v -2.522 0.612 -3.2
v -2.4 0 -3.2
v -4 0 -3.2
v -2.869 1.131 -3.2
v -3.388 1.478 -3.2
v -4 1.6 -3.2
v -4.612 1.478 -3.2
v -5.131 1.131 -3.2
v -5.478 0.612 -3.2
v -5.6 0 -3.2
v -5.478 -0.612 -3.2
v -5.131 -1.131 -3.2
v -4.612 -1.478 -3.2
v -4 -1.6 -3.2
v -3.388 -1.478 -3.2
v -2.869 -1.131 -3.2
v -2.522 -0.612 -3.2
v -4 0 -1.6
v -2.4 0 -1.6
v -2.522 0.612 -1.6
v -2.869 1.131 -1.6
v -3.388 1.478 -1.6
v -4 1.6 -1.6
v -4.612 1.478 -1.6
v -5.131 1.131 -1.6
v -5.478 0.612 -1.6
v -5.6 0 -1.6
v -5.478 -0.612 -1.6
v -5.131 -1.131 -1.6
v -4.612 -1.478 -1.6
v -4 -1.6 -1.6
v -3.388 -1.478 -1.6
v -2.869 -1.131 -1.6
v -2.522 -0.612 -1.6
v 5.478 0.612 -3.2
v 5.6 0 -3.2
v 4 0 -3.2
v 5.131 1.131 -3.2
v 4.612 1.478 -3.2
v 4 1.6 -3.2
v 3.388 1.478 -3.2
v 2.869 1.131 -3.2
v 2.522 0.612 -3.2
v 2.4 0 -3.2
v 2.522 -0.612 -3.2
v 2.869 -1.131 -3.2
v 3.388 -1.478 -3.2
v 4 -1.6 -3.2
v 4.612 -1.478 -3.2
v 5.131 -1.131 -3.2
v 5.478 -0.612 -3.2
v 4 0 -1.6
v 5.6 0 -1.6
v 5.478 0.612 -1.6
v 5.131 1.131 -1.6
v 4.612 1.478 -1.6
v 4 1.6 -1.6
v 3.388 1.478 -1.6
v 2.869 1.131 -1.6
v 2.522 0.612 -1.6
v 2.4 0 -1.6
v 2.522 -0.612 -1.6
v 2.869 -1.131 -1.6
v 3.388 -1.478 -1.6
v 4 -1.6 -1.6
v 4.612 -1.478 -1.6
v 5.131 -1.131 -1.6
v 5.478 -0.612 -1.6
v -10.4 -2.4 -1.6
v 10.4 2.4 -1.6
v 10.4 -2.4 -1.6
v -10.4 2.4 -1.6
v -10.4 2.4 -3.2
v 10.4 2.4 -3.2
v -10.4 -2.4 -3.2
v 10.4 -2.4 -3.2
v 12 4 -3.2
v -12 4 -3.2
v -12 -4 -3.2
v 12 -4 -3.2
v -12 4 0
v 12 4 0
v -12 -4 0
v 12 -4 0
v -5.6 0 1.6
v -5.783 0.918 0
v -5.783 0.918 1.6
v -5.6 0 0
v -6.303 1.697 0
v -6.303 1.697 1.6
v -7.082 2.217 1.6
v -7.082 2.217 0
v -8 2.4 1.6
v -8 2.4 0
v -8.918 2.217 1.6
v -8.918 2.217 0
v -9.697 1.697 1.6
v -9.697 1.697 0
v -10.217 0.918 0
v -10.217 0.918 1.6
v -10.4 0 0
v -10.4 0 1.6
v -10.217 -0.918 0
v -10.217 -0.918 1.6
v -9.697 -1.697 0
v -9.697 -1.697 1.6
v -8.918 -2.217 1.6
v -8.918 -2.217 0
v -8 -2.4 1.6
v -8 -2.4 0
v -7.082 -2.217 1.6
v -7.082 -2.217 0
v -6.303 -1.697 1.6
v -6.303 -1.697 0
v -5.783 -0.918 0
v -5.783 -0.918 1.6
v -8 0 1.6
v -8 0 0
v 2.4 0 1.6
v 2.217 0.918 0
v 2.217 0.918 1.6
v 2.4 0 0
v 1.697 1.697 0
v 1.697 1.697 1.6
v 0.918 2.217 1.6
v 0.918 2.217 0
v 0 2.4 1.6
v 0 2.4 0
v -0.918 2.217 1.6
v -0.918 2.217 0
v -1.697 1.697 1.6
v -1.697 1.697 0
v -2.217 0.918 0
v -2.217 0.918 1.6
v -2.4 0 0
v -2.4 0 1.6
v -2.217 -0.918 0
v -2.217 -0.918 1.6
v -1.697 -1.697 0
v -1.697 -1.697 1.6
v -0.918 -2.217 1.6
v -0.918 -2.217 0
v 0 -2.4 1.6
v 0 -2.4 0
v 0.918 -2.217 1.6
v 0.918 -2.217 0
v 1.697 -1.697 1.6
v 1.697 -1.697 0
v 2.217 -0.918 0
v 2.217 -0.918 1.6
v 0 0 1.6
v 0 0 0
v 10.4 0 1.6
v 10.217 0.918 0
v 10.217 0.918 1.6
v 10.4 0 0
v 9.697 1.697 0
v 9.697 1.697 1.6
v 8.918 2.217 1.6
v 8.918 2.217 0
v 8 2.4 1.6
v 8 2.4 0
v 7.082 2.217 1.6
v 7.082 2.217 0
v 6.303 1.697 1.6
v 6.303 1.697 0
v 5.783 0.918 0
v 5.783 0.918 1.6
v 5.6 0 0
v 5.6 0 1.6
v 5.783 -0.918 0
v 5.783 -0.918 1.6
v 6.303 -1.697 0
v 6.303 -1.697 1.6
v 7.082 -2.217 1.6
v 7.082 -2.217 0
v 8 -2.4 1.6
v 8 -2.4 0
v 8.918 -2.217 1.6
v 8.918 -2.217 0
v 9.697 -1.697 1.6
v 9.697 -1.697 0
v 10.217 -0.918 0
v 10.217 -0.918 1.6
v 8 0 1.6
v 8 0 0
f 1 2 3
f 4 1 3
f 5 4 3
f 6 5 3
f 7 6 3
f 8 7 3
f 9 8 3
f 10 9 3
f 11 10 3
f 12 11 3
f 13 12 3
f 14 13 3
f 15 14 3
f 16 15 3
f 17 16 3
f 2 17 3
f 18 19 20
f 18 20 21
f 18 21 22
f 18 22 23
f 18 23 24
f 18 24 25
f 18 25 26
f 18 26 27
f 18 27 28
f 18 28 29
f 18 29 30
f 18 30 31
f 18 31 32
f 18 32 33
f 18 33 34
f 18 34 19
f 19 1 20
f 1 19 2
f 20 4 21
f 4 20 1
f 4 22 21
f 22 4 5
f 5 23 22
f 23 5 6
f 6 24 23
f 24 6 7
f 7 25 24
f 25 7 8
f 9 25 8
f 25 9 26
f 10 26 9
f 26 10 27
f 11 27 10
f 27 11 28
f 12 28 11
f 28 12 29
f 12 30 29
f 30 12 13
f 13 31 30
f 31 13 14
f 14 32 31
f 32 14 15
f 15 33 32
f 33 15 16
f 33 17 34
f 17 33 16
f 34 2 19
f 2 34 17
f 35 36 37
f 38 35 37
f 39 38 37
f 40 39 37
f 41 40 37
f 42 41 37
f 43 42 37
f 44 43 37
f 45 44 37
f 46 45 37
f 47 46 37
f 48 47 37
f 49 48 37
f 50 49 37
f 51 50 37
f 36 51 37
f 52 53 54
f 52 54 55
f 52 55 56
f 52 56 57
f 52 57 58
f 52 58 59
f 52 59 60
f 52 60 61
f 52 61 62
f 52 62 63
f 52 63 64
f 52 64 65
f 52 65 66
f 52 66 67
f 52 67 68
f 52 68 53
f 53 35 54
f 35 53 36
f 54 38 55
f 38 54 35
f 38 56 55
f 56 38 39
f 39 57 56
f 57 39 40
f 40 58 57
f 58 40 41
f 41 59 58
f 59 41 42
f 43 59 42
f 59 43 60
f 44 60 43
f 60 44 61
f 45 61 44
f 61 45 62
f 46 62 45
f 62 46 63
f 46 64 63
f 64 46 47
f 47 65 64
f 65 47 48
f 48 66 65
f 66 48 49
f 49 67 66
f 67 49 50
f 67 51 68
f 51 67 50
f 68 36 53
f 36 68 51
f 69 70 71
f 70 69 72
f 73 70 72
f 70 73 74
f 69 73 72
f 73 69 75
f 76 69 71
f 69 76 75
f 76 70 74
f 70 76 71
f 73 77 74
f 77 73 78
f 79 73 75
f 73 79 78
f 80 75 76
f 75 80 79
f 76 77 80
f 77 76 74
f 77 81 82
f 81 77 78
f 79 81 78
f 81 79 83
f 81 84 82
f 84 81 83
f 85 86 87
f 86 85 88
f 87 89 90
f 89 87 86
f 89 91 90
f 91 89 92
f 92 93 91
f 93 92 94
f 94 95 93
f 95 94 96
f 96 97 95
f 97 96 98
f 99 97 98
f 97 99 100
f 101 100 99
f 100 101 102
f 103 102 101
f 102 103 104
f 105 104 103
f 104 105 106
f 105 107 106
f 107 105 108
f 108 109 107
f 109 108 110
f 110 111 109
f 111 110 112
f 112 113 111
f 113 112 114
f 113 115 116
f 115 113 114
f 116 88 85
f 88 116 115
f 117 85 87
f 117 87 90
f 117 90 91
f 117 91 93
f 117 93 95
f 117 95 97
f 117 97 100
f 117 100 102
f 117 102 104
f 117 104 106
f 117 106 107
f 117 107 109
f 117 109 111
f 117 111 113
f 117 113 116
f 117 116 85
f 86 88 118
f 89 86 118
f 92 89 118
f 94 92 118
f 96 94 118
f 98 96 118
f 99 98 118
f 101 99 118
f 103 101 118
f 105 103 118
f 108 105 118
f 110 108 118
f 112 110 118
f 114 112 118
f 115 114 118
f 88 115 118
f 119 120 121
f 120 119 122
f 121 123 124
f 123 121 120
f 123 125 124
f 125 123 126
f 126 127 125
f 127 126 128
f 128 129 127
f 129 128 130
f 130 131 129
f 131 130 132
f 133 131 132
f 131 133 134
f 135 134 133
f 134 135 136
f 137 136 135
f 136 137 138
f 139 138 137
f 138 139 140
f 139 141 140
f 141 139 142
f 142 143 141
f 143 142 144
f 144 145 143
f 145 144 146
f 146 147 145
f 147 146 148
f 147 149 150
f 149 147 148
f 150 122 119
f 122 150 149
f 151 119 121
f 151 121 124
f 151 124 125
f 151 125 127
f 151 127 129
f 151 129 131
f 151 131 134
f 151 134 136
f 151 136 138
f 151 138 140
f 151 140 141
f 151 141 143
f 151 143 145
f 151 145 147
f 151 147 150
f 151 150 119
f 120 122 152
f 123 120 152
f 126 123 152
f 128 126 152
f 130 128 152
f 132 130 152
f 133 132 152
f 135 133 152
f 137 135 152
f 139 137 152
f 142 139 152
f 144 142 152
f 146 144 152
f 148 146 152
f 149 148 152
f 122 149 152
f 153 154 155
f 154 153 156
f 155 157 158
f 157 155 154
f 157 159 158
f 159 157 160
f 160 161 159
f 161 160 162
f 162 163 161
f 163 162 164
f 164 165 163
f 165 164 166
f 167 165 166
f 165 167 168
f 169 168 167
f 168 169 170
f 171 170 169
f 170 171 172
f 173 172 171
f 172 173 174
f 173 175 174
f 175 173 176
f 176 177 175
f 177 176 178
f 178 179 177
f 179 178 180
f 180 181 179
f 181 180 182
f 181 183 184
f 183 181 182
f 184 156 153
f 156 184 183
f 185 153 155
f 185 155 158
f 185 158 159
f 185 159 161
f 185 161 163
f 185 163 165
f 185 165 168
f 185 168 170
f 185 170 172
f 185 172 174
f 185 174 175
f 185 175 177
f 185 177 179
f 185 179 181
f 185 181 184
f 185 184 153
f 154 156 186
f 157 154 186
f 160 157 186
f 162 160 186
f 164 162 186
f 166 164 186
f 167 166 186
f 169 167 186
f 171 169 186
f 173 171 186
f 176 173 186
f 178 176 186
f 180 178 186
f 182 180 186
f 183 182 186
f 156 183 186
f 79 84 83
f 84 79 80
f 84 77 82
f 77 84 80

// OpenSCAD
// file: ../p/4-4edge.scad
use <../lib.scad>
function ldraw_lib__4_4edge() = [
// 0 Circle 1.0
// 0 Name: 4-4edge.dat
// 0 Author: James Jessiman
// 0 !LDRAW_ORG Primitive UPDATE 2017-01
// 0 !LICENSE Licensed under CC BY 2.0 and CC BY 4.0 : see CAreadme.txt
// 
// 0 BFC CERTIFY CCW
  [0,"BFC","CERTIFY"],
  [0,"BFC","CCW"],
// 
// 0 !HISTORY 1998-12-15 [PTadmin] Official Update 1998-10
// 0 !HISTORY 2005-12-28 [PTadmin] Official Update 2005-01
// 0 !HISTORY 2007-06-24 [PTadmin] Header formatted for Contributor Agreement
// 0 !HISTORY 2008-07-01 [PTadmin] Official Update 2008-01
// 0 !HISTORY 2017-01-15 [Steffen] BFCed
// 0 !HISTORY 2017-12-30 [PTadmin] Official Update 2017-01
// 
// 
// 2 24 1 0 0 0.9239 0 0.3827
  [2,24,1,0,0,0.9239,0,0.3827],
// 2 24 0.9239 0 0.3827 0.7071 0 0.7071
  [2,24,0.9239,0,0.3827,0.7071,0,0.7071],
// 2 24 0.7071 0 0.7071 0.3827 0 0.9239
  [2,24,0.7071,0,0.7071,0.3827,0,0.9239],
// 2 24 0.3827 0 0.9239 0 0 1
  [2,24,0.3827,0,0.9239,0,0,1],
// 2 24 0 0 1 -0.3827 0 0.9239
  [2,24,0,0,1,-0.3827,0,0.9239],
// 2 24 -0.3827 0 0.9239 -0.7071 0 0.7071
  [2,24,-0.3827,0,0.9239,-0.7071,0,0.7071],
// 2 24 -0.7071 0 0.7071 -0.9239 0 0.3827
  [2,24,-0.7071,0,0.7071,-0.9239,0,0.3827],
// 2 24 -0.9239 0 0.3827 -1 0 -0
  [2,24,-0.9239,0,0.3827,-1,0,-0],
// 2 24 -1 0 -0 -0.9239 0 -0.3827
  [2,24,-1,0,-0,-0.9239,0,-0.3827],
// 2 24 -0.9239 0 -0.3827 -0.7071 0 -0.7071
  [2,24,-0.9239,0,-0.3827,-0.7071,0,-0.7071],
// 2 24 -0.7071 0 -0.7071 -0.3827 0 -0.9239
  [2,24,-0.7071,0,-0.7071,-0.3827,0,-0.9239],
// 2 24 -0.3827 0 -0.9239 0 0 -1
  [2,24,-0.3827,0,-0.9239,0,0,-1],
// 2 24 0 0 -1 0.3827 0 -0.9239
  [2,24,0,0,-1,0.3827,0,-0.9239],
// 2 24 0.3827 0 -0.9239 0.7071 0 -0.7071
  [2,24,0.3827,0,-0.9239,0.7071,0,-0.7071],
// 2 24 0.7071 0 -0.7071 0.9239 0 -0.3827
  [2,24,0.7071,0,-0.7071,0.9239,0,-0.3827],
// 2 24 0.9239 0 -0.3827 1 0 0
  [2,24,0.9239,0,-0.3827,1,0,0],
];
module ldraw_lib__4_4edge(step=0, col=false, unit=2/5, alt=false, line=0.2, solid=!$preview)
    makepoly(ldraw_lib__4_4edge(), step=step, col=col, unit=unit, alt=alt, line=line, solid=solid);
ldraw_lib__4_4edge(line=0.2);
// file: ../p/4-4disc.scad
use <../lib.scad>
function ldraw_lib__4_4disc() = [
// 0 Disc 1.0
// 0 Name: 4-4disc.dat
// 0 Author: James Jessiman
// 0 !LDRAW_ORG Primitive UPDATE 2002-02
// 0 !LICENSE Licensed under CC BY 2.0 and CC BY 4.0 : see CAreadme.txt
// 
// 0 BFC CERTIFY CCW
  [0,"BFC","CERTIFY"],
  [0,"BFC","CCW"],
// 
// 0 !HISTORY 1998-12-15 [PTadmin] Official Update 1998-10
// 0 !HISTORY 2002-03-23 [sbliss] Added BFC statement
// 0 !HISTORY 2002-04-25 [PTadmin] Official Update 2002-02
// 0 !HISTORY 2007-06-24 [PTadmin] Header formatted for Contributor Agreement
// 0 !HISTORY 2008-07-01 [PTadmin] Official Update 2008-01
// 
// 
// 3 16 0 0 0 1 0 0 0.9239 0 0.3827
  [3,16,0,0,0,1,0,0,0.9239,0,0.3827],
// 3 16 0 0 0 0.9239 0 0.3827 0.7071 0 0.7071
  [3,16,0,0,0,0.9239,0,0.3827,0.7071,0,0.7071],
// 3 16 0 0 0 0.7071 0 0.7071 0.3827 0 0.9239
  [3,16,0,0,0,0.7071,0,0.7071,0.3827,0,0.9239],
// 3 16 0 0 0 0.3827 0 0.9239 0 0 1
  [3,16,0,0,0,0.3827,0,0.9239,0,0,1],
// 3 16 0 0 0 0 0 1 -0.3827 0 0.9239
  [3,16,0,0,0,0,0,1,-0.3827,0,0.9239],
// 3 16 0 0 0 -0.3827 0 0.9239 -0.7071 0 0.7071
  [3,16,0,0,0,-0.3827,0,0.9239,-0.7071,0,0.7071],
// 3 16 0 0 0 -0.7071 0 0.7071 -0.9239 0 0.3827
  [3,16,0,0,0,-0.7071,0,0.7071,-0.9239,0,0.3827],
// 3 16 0 0 0 -0.9239 0 0.3827 -1 0 -0
  [3,16,0,0,0,-0.9239,0,0.3827,-1,0,-0],
// 3 16 0 0 0 -1 0 -0 -0.9239 0 -0.3827
  [3,16,0,0,0,-1,0,-0,-0.9239,0,-0.3827],
// 3 16 0 0 0 -0.9239 0 -0.3827 -0.7071 0 -0.7071
  [3,16,0,0,0,-0.9239,0,-0.3827,-0.7071,0,-0.7071],
// 3 16 0 0 0 -0.7071 0 -0.7071 -0.3827 0 -0.9239
  [3,16,0,0,0,-0.7071,0,-0.7071,-0.3827,0,-0.9239],
// 3 16 0 0 0 -0.3827 0 -0.9239 0 0 -1
  [3,16,0,0,0,-0.3827,0,-0.9239,0,0,-1],
// 3 16 0 0 0 0 0 -1 0.3827 0 -0.9239
  [3,16,0,0,0,0,0,-1,0.3827,0,-0.9239],
// 3 16 0 0 0 0.3827 0 -0.9239 0.7071 0 -0.7071
  [3,16,0,0,0,0.3827,0,-0.9239,0.7071,0,-0.7071],
// 3 16 0 0 0 0.7071 0 -0.7071 0.9239 0 -0.3827
  [3,16,0,0,0,0.7071,0,-0.7071,0.9239,0,-0.3827],
// 3 16 0 0 0 0.9239 0 -0.3827 1 0 0
  [3,16,0,0,0,0.9239,0,-0.3827,1,0,0],
// 0
];
module ldraw_lib__4_4disc(step=0, col=false, unit=2/5, alt=false, line=0.2, solid=!$preview)
    makepoly(ldraw_lib__4_4disc(), step=step, col=col, unit=unit, alt=alt, line=line, solid=solid);
ldraw_lib__4_4disc(line=0.2);
// file: ../p/4-4cyli.scad
use <../lib.scad>
$fa=1; $fs=0.2;
function ldraw_lib__4_4cyli(realsolid=false) = [
// 0 Cylinder 1.0
// 0 Name: 4-4cyli.dat
// 0 Author: James Jessiman
// 0 !LDRAW_ORG Primitive UPDATE 2005-01
// 0 !LICENSE Licensed under CC BY 2.0 and CC BY 4.0 : see CAreadme.txt
// 
// 0 BFC CERTIFY CCW
  [0,"BFC","CERTIFY"],
  [0,"BFC","CCW"],
// 
// 0 !HISTORY 1998-12-15 [PTadmin] Official Update 1998-10
// 0 !HISTORY 2002-03-23 [sbliss] Added BFC statement; merged headers from files in distributions LDraw 0.27 and Complete.
// 0 !HISTORY 2002-04-25 [PTadmin] Official Update 2002-02
// 0 !HISTORY 2004-12-14 [guyvivan] BFC CCW
// 0 !HISTORY 2005-12-28 [PTadmin] Official Update 2005-01
// 0 !HISTORY 2007-06-24 [PTadmin] Header formatted for Contributor Agreement
// 0 !HISTORY 2008-07-01 [PTadmin] Official Update 2008-01
// 
// 
// 4 16 1 1 0 0.9239 1 0.3827 0.9239 0 0.3827 1 0 0
  [4,16,1,1,0,0.9239,1,0.3827,0.9239,0,0.3827,1,0,0],
// 5 24 1 0 0 1 1 0 0.9239 0 0.3827 0.9239 0 -0.3827
  [5,24,1,0,0,1,1,0,0.9239,0,0.3827,0.9239,0,-0.3827],
// 4 16 0.9239 1 0.3827 0.7071 1 0.7071 0.7071 0 0.7071 0.9239 0 0.3827
  [4,16,0.9239,1,0.3827,0.7071,1,0.7071,0.7071,0,0.7071,0.9239,0,0.3827],
// 5 24 0.9239 0 0.3827 0.9239 1 0.3827 0.7071 0 0.7071 1 0 0
  [5,24,0.9239,0,0.3827,0.9239,1,0.3827,0.7071,0,0.7071,1,0,0],
// 4 16 0.7071 1 0.7071 0.3827 1 0.9239 0.3827 0 0.9239 0.7071 0 0.7071
  [4,16,0.7071,1,0.7071,0.3827,1,0.9239,0.3827,0,0.9239,0.7071,0,0.7071],
// 5 24 0.7071 0 0.7071 0.7071 1 0.7071 0.3827 0 0.9239 0.9239 0 0.3827
  [5,24,0.7071,0,0.7071,0.7071,1,0.7071,0.3827,0,0.9239,0.9239,0,0.3827],
// 4 16 0.3827 1 0.9239 0 1 1 0 0 1 0.3827 0 0.9239
  [4,16,0.3827,1,0.9239,0,1,1,0,0,1,0.3827,0,0.9239],
// 5 24 0.3827 0 0.9239 0.3827 1 0.9239 0 0 1 0.7071 0 0.7071
  [5,24,0.3827,0,0.9239,0.3827,1,0.9239,0,0,1,0.7071,0,0.7071],
// 4 16 0 1 1 -0.3827 1 0.9239 -0.3827 0 0.9239 0 0 1
  [4,16,0,1,1,-0.3827,1,0.9239,-0.3827,0,0.9239,0,0,1],
// 5 24 0 0 1 0 1 1 -0.3827 0 0.9239 0.3827 0 0.9239
  [5,24,0,0,1,0,1,1,-0.3827,0,0.9239,0.3827,0,0.9239],
// 4 16 -0.3827 1 0.9239 -0.7071 1 0.7071 -0.7071 0 0.7071 -0.3827 0 0.9239
  [4,16,-0.3827,1,0.9239,-0.7071,1,0.7071,-0.7071,0,0.7071,-0.3827,0,0.9239],
// 5 24 -0.3827 0 0.9239 -0.3827 1 0.9239 -0.7071 0 0.7071 0 0 1
  [5,24,-0.3827,0,0.9239,-0.3827,1,0.9239,-0.7071,0,0.7071,0,0,1],
// 4 16 -0.7071 1 0.7071 -0.9239 1 0.3827 -0.9239 0 0.3827 -0.7071 0 0.7071
  [4,16,-0.7071,1,0.7071,-0.9239,1,0.3827,-0.9239,0,0.3827,-0.7071,0,0.7071],
// 5 24 -0.7071 0 0.7071 -0.7071 1 0.7071 -0.9239 0 0.3827 -0.3827 0 0.9239
  [5,24,-0.7071,0,0.7071,-0.7071,1,0.7071,-0.9239,0,0.3827,-0.3827,0,0.9239],
// 4 16 -0.9239 1 0.3827 -1 1 0 -1 0 0 -0.9239 0 0.3827
  [4,16,-0.9239,1,0.3827,-1,1,0,-1,0,0,-0.9239,0,0.3827],
// 5 24 -0.9239 0 0.3827 -0.9239 1 0.3827 -1 0 0 -0.7071 0 0.7071
  [5,24,-0.9239,0,0.3827,-0.9239,1,0.3827,-1,0,0,-0.7071,0,0.7071],
// 4 16 -1 1 0 -0.9239 1 -0.3827 -0.9239 0 -0.3827 -1 0 0
  [4,16,-1,1,0,-0.9239,1,-0.3827,-0.9239,0,-0.3827,-1,0,0],
// 5 24 -1 0 0 -1 1 0 -0.9239 0 -0.3827 -0.9239 0 0.3827
  [5,24,-1,0,0,-1,1,0,-0.9239,0,-0.3827,-0.9239,0,0.3827],
// 4 16 -0.9239 1 -0.3827 -0.7071 1 -0.7071 -0.7071 0 -0.7071 -0.9239 0 -0.3827
  [4,16,-0.9239,1,-0.3827,-0.7071,1,-0.7071,-0.7071,0,-0.7071,-0.9239,0,-0.3827],
// 5 24 -0.9239 0 -0.3827 -0.9239 1 -0.3827 -0.7071 0 -0.7071 -1 0 0
  [5,24,-0.9239,0,-0.3827,-0.9239,1,-0.3827,-0.7071,0,-0.7071,-1,0,0],
// 4 16 -0.7071 1 -0.7071 -0.3827 1 -0.9239 -0.3827 0 -0.9239 -0.7071 0 -0.7071
  [4,16,-0.7071,1,-0.7071,-0.3827,1,-0.9239,-0.3827,0,-0.9239,-0.7071,0,-0.7071],
// 5 24 -0.7071 0 -0.7071 -0.7071 1 -0.7071 -0.3827 0 -0.9239 -0.9239 0 -0.3827
  [5,24,-0.7071,0,-0.7071,-0.7071,1,-0.7071,-0.3827,0,-0.9239,-0.9239,0,-0.3827],
// 4 16 -0.3827 1 -0.9239 0 1 -1 0 0 -1 -0.3827 0 -0.9239
  [4,16,-0.3827,1,-0.9239,0,1,-1,0,0,-1,-0.3827,0,-0.9239],
// 5 24 -0.3827 0 -0.9239 -0.3827 1 -0.9239 0 0 -1 -0.7071 0 -0.7071
  [5,24,-0.3827,0,-0.9239,-0.3827,1,-0.9239,0,0,-1,-0.7071,0,-0.7071],
// 4 16 0 1 -1 0.3827 1 -0.9239 0.3827 0 -0.9239 0 0 -1
  [4,16,0,1,-1,0.3827,1,-0.9239,0.3827,0,-0.9239,0,0,-1],
// 5 24 0 0 -1 0 1 -1 0.3827 0 -0.9239 -0.3827 0 -0.9239
  [5,24,0,0,-1,0,1,-1,0.3827,0,-0.9239,-0.3827,0,-0.9239],
// 4 16 0.3827 1 -0.9239 0.7071 1 -0.7071 0.7071 0 -0.7071 0.3827 0 -0.9239
  [4,16,0.3827,1,-0.9239,0.7071,1,-0.7071,0.7071,0,-0.7071,0.3827,0,-0.9239],
// 5 24 0.3827 0 -0.9239 0.3827 1 -0.9239 0.7071 0 -0.7071 0 0 -1
  [5,24,0.3827,0,-0.9239,0.3827,1,-0.9239,0.7071,0,-0.7071,0,0,-1],
// 4 16 0.7071 1 -0.7071 0.9239 1 -0.3827 0.9239 0 -0.3827 0.7071 0 -0.7071
  [4,16,0.7071,1,-0.7071,0.9239,1,-0.3827,0.9239,0,-0.3827,0.7071,0,-0.7071],
// 5 24 0.7071 0 -0.7071 0.7071 1 -0.7071 0.9239 0 -0.3827 0.3827 0 -0.9239
  [5,24,0.7071,0,-0.7071,0.7071,1,-0.7071,0.9239,0,-0.3827,0.3827,0,-0.9239],
// 4 16 0.9239 1 -0.3827 1 1 0 1 0 0 0.9239 0 -0.3827
  [4,16,0.9239,1,-0.3827,1,1,0,1,0,0,0.9239,0,-0.3827],
// 5 24 0.9239 0 -0.3827 0.9239 1 -0.3827 1 0 0 0.7071 0 -0.7071
  [5,24,0.9239,0,-0.3827,0.9239,1,-0.3827,1,0,0,0.7071,0,-0.7071],
// 0
];
module ldraw_lib__4_4cyli(step=0, col=false, unit=2/5, alt=false, line=0.2, solid=!$preview)
    makepoly(ldraw_lib__4_4cyli(solid), step=step, col=col, unit=unit, alt=alt, line=line, solid=solid);
ldraw_lib__4_4cyli(line=0.2);
// file: ../p/stud3.scad
use <../lib.scad>
use <4-4cyli.scad>
use <4-4disc.scad>
use <4-4edge.scad>
function ldraw_lib__stud3() = [
// 0 Stud Tube Solid
// 0 Name: stud3.dat
// 0 Author: James Jessiman
// 0 !LDRAW_ORG Primitive UPDATE 2012-01
// 0 !LICENSE Licensed under CC BY 4.0 : see CAreadme.txt
// 
// 0 BFC CERTIFY CCW
  [0,"BFC","CERTIFY"],
  [0,"BFC","CCW"],
// 
// 0 !HISTORY 2002-04-04 [sbliss] Modified for BFC compliance
// 0 !HISTORY 2002-04-25 [PTadmin] Official Update 2002-02
// 0 !HISTORY 2007-06-24 [PTadmin] Header formatted for Contributor Agreement
// 0 !HISTORY 2008-07-01 [PTadmin] Official Update 2008-01
// 0 !HISTORY 2012-02-16 [Philo] Changed to CCW
// 0 !HISTORY 2012-03-30 [PTadmin] Official Update 2012-01
// 
// 
// 1 16 0 -4 0 4 0 0 0 1 0 0 0 4 4-4edge.dat
  [1,16,0,-4,0,4,0,0,0,1,0,0,0,4, ldraw_lib__4_4edge()],
// 1 16 0 0 0 4 0 0 0 1 0 0 0 4 4-4edge.dat
  [1,16,0,0,0,4,0,0,0,1,0,0,0,4, ldraw_lib__4_4edge()],
// 1 16 0 -4 0 4 0 0 0 1 0 0 0 4 4-4disc.dat
  [1,16,0,-4,0,4,0,0,0,1,0,0,0,4, ldraw_lib__4_4disc()],
  [-1,16,0,0,0,4,0,0,0,-1,0,0,0,4, ldraw_lib__4_4disc()],
// 1 16 0 -4 0 4 0 0 0 4 0 0 0 4 4-4cyli.dat
  [1,16,0,-4,0,4,0,0,0,4,0,0,0,4, ldraw_lib__4_4cyli()],
];
module ldraw_lib__stud3(step=0, col=false, unit=2/5, alt=false, line=0.2, solid=!$preview)
    makepoly(ldraw_lib__stud3(), step=step, col=col, unit=unit, alt=alt, line=line, solid=solid);
ldraw_lib__stud3(line=0.2);
// file: ../p/stud.scad
use <../lib.scad>
use <4-4cyli.scad>
use <4-4disc.scad>
use <4-4edge.scad>
function ldraw_lib__stud() = [
// 0 Stud
// 0 Name: stud.dat
// 0 Author: James Jessiman
// 0 !LDRAW_ORG Primitive UPDATE 2012-01
// 0 !LICENSE Licensed under CC BY 4.0 : see CAreadme.txt
// 
// 0 BFC CERTIFY CCW
  [0,"BFC","CERTIFY"],
  [0,"BFC","CCW"],
// 
// 0 !HISTORY 2002-04-04 [sbliss] Modified for BFC compliance
// 0 !HISTORY 2002-04-25 [PTadmin] Official Update 2002-02
// 0 !HISTORY 2007-06-24 [PTadmin] Header formatted for Contributor Agreement
// 0 !HISTORY 2008-07-01 [PTadmin] Official Update 2008-01
// 0 !HISTORY 2012-02-16 [Philo] Changed to CCW
// 0 !HISTORY 2012-03-30 [PTadmin] Official Update 2012-01
// 
// 
// 1 16 0 0 0 6 0 0 0 1 0 0 0 6 4-4edge.dat
  [1,16,0,0,0,6,0,0,0,1,0,0,0,6, ldraw_lib__4_4edge()],
// 1 16 0 -4 0 6 0 0 0 1 0 0 0 6 4-4edge.dat
  [1,16,0,-4,0,6,0,0,0,1,0,0,0,6, ldraw_lib__4_4edge()],
// 1 16 0 0 0 6 0 0 0 -4 0 0 0 6 4-4cyli.dat
  [1,16,0,0,0,6,0,0,0,-4,0,0,0,6, ldraw_lib__4_4cyli()],
// 1 16 0 -4 0 6 0 0 0 1 0 0 0 6 4-4disc.dat
  [1,16,0,-4,0,6,0,0,0,1,0,0,0,6, ldraw_lib__4_4disc()],
  [-1,16,0,0,0,6,0,0,0,-1,0,0,0,6, ldraw_lib__4_4disc()],
];
module ldraw_lib__stud(step=0, col=false, unit=2/5, alt=false, line=0.2, solid=!$preview)
    makepoly(ldraw_lib__stud(), step=step, col=col, unit=unit, alt=alt, line=line, solid=solid);
ldraw_lib__stud(line=0.2);
// file: ../p/stug3-1x2.scad
use <../lib.scad>
use <stud3.scad>
function ldraw_lib__stug3_1x2() = [
// 0 Stud Tube Solid Group  1 x  2
// 0 Name: stug3-1x2.dat
// 0 Author: Steffen [Steffen]
// 0 !LDRAW_ORG Primitive UPDATE 2013-02
// 0 !LICENSE Licensed under CC BY 4.0 : see CAreadme.txt
// 
// 0 BFC CERTIFY CCW
  [0,"BFC","CERTIFY"],
  [0,"BFC","CCW"],
// 
// 0 !HISTORY 2013-12-23 [PTadmin] Official Update 2013-02
// 
// 
// 1 16 -10 0 0 1 0 0 0 1 0 0 0 1 stud3.dat
  [1,16,-10,0,0,1,0,0,0,1,0,0,0,1, ldraw_lib__stud3()],
// 1 16 10 0 0 1 0 0 0 1 0 0 0 1 stud3.dat
  [1,16,10,0,0,1,0,0,0,1,0,0,0,1, ldraw_lib__stud3()],
];
module ldraw_lib__stug3_1x2(step=0, col=false, unit=2/5, alt=false, line=0.2, solid=!$preview)
    makepoly(ldraw_lib__stug3_1x2(), step=step, col=col, unit=unit, alt=alt, line=line, solid=solid);
ldraw_lib__stug3_1x2(line=0.2);
// file: ../p/stug-1x3.scad
use <../lib.scad>
use <stud.scad>
$fa=1; $fs=0.2;
function ldraw_lib__stug_1x3(realsolid=false) = [
// 0 Stud Group  1 x  3
// 0 Name: stug-1x3.dat
// 0 Author: Steffen [Steffen]
// 0 !LDRAW_ORG Primitive UPDATE 2012-01
// 0 !LICENSE Licensed under CC BY 2.0 and CC BY 4.0 : see CAreadme.txt
// 
// 0 BFC CERTIFY CCW
  [0,"BFC","CERTIFY"],
  [0,"BFC","CCW"],
// 
// 0 !HISTORY 2012-03-30 [PTadmin] Official Update 2012-01
// 
// 
// 1 16 -20 0 0 1 0 0 0 1 0 0 0 1 stud.dat
  [1,16,-20,0,0,1,0,0,0,1,0,0,0,1, ldraw_lib__stud(realsolid)],
// 1 16 0 0 0 1 0 0 0 1 0 0 0 1 stud.dat
  [1,16,0,0,0,1,0,0,0,1,0,0,0,1, ldraw_lib__stud(realsolid)],
// 1 16 20 0 0 1 0 0 0 1 0 0 0 1 stud.dat
  [1,16,20,0,0,1,0,0,0,1,0,0,0,1, ldraw_lib__stud(realsolid)],
];
module ldraw_lib__stug_1x3(step=0, col=false, unit=2/5, alt=false, line=0.2, solid=!$preview)
    makepoly(ldraw_lib__stug_1x3(solid), step=step, col=col, unit=unit, alt=alt, line=line, solid=solid);
ldraw_lib__stug_1x3(line=0.2);
// file: ../p/recte4.scad
use <../lib.scad>
function ldraw_lib__recte4() = [
// 0 Rectangle Empty with 4 Edges
// 0 Name: recte4.dat
// 0 Author: Steffen [Steffen]
// 0 !LDRAW_ORG Primitive UPDATE 2010-03
// 0 !LICENSE Licensed under CC BY 4.0 : see CAreadme.txt
// 
// 0 BFC CERTIFY CCW
  [0,"BFC","CERTIFY"],
  [0,"BFC","CCW"],
// 
// 0 !HISTORY 2010-12-31 [PTadmin] Official Update 2010-03
// 
// 
// 2 24 1 0 1 -1 0 1
  [2,24,1,0,1,-1,0,1],
// 2 24 -1 0 1 -1 0 -1
  [2,24,-1,0,1,-1,0,-1],
// 2 24 -1 0 -1 1 0 -1
  [2,24,-1,0,-1,1,0,-1],
// 2 24 1 0 -1 1 0 1
  [2,24,1,0,-1,1,0,1],
];
module ldraw_lib__recte4(step=0, col=false, unit=2/5, alt=false, line=0.2, solid=!$preview)
    makepoly(ldraw_lib__recte4(), step=step, col=col, unit=unit, alt=alt, line=line, solid=solid);
ldraw_lib__recte4(line=0.2);
// file: ../p/box5.scad
use <../lib.scad>
function ldraw_lib__box5() = [
// 0 Box with 5 Faces and All Edges
// 0 Name: box5.dat
// 0 Author: James Jessiman
// 0 !LDRAW_ORG Primitive UPDATE 2012-01
// 0 !LICENSE Licensed under CC BY 2.0 and CC BY 4.0 : see CAreadme.txt
// 
// 0 BFC CERTIFY CCW
  [0,"BFC","CERTIFY"],
  [0,"BFC","CCW"],
// 
// 0 !HISTORY 2002-04-03 [sbliss] Modified for BFC compliance
// 0 !HISTORY 2002-04-25 [PTadmin] Official Update 2002-02
// 0 !HISTORY 2007-06-24 [PTadmin] Header formatted for Contributor Agreement
// 0 !HISTORY 2008-07-01 [PTadmin] Official Update 2008-01
// 0 !HISTORY 2012-02-16 [Philo] Changed to CCW
// 0 !HISTORY 2012-03-30 [PTadmin] Official Update 2012-01
// 
// 
// 2 24 1 1 1 -1 1 1
  [2,24,1,1,1,-1,1,1],
// 2 24 -1 1 1 -1 1 -1
  [2,24,-1,1,1,-1,1,-1],
// 2 24 -1 1 -1 1 1 -1
  [2,24,-1,1,-1,1,1,-1],
// 2 24 1 1 -1 1 1 1
  [2,24,1,1,-1,1,1,1],
// 2 24 1 0 1 -1 0 1
  [2,24,1,0,1,-1,0,1],
// 2 24 -1 0 1 -1 0 -1
  [2,24,-1,0,1,-1,0,-1],
// 2 24 -1 0 -1 1 0 -1
  [2,24,-1,0,-1,1,0,-1],
// 2 24 1 0 -1 1 0 1
  [2,24,1,0,-1,1,0,1],
// 2 24 1 0 1 1 1 1
  [2,24,1,0,1,1,1,1],
// 2 24 -1 0 1 -1 1 1
  [2,24,-1,0,1,-1,1,1],
// 2 24 1 0 -1 1 1 -1
  [2,24,1,0,-1,1,1,-1],
// 2 24 -1 0 -1 -1 1 -1
  [2,24,-1,0,-1,-1,1,-1],
// 4 16 -1 1 1 1 1 1 1 1 -1 -1 1 -1
  [4,16,-1,1,1,1,1,1,1,1,-1,-1,1,-1],
// 4 16 -1 1 1 -1 0 1 1 0 1 1 1 1
  [4,16,-1,1,1,-1,0,1,1,0,1,1,1,1],
// 4 16 -1 1 -1 -1 0 -1 -1 0 1 -1 1 1
  [4,16,-1,1,-1,-1,0,-1,-1,0,1,-1,1,1],
// 4 16 1 1 -1 1 0 -1 -1 0 -1 -1 1 -1
  [4,16,1,1,-1,1,0,-1,-1,0,-1,-1,1,-1],
// 4 16 1 1 1 1 0 1 1 0 -1 1 1 -1
  [4,16,1,1,1,1,0,1,1,0,-1,1,1,-1],
];
makepoly(ldraw_lib__box5(), line=0.2);
// file: ../p/box3-5a.scad
use <../lib.scad>
$fa=1; $fs=0.2;
function ldraw_lib__box3_5a(realsolid=false) = [
// 0 Box with 3 Adjacent Faces without 5 Adjacent Edges
// 0 Name: box3-5a.dat
// 0 Author: Philippe Hurbain [Philo]
// 0 !LDRAW_ORG Primitive UPDATE 2013-02
// 0 !LICENSE Licensed under CC BY 2.0 and CC BY 4.0 : see CAreadme.txt
// 
// 0 BFC CERTIFY CCW
  [0,"BFC","CERTIFY"],
  [0,"BFC","CCW"],
// 
// 0 !HISTORY 2013-12-23 [PTadmin] Official Update 2013-02
// 
// 
// 2 24 1 1 1 -1 1 1
  [2,24,1,1,1,-1,1,1],
// 2 24 -1 1 1 -1 1 -1
  [2,24,-1,1,1,-1,1,-1],
// 2 24 1 1 -1 1 1 1
  [2,24,1,1,-1,1,1,1],
// 2 24 1 -1 1 -1 -1 1
  [2,24,1,-1,1,-1,-1,1],
// 2 24 1 -1 -1 1 -1 1
  [2,24,1,-1,-1,1,-1,1],
// 2 24 1 -1 1 1 1 1
  [2,24,1,-1,1,1,1,1],
// 2 24 -1 -1 1 -1 1 1
  [2,24,-1,-1,1,-1,1,1],
// 
// 4 16 1 1 1 1 1 -1 -1 1 -1 -1 1 1
  [4,16,1,1,1,1,1,-1,-1,1,-1,-1,1,1],
// 4 16 1 1 1 1 -1 1 1 -1 -1 1 1 -1
  [4,16,1,1,1,1,-1,1,1,-1,-1,1,1,-1],
// 4 16 1 1 1 -1 1 1 -1 -1 1 1 -1 1
  [4,16,1,1,1,-1,1,1,-1,-1,1,1,-1,1],
];
module ldraw_lib__box3_5a(step=0, col=false, unit=2/5, alt=false, line=0.2, solid=!$preview)
    makepoly(ldraw_lib__box3_5a(solid), step=step, col=col, unit=unit, alt=alt, line=line, solid=solid);
ldraw_lib__box3_5a(line=0.2);
// file: s/3623s02.scad
use <../../lib.scad>
use <../../p/box3-5a.scad>
use <../../p/box5.scad>
use <../../p/recte4.scad>
use <../../p/stug-1x3.scad>
use <../../p/stug3-1x2.scad>
function ldraw_lib__s__3623s02() = [
// 0 ~Plate  1 x  3 without Front  and Side Face
// 0 Name: s\3623s02.dat
// 0 Author: Magnus Forsberg [MagFors]
// 0 !LDRAW_ORG Subpart UPDATE 2024-06
// 0 !LICENSE Licensed under CC BY 4.0 : see CAreadme.txt
// 
// 0 BFC CERTIFY CCW
  [0,"BFC","CERTIFY"],
  [0,"BFC","CCW"],
// 
// 0 !HISTORY 2024-07-29 [OrionP] Official Update 2024-06
// 
// 
// 1 16 0 4 0 1 0 0 0 -1 0 0 0 1 stug3-1x2.dat
  [1,16,0,4,0,1,0,0,0,-1,0,0,0,1, ldraw_lib__stug3_1x2()],
// 0 BFC INVERTNEXT
  [0,"BFC","INVERTNEXT"],
// 1 16 0 8 0 26 0 0 0 -4 0 0 0 6 box5.dat
  [1,16,0,8,0,26,0,0,0,-4,0,0,0,6, ldraw_lib__box5()],
// 4 16 30 8 10 26 8 6 -26 8 6 -30 8 10
  [4,16,30,8,10,26,8,6,-26,8,6,-30,8,10],
// 4 16 -30 8 10 -26 8 6 -26 8 -6 -30 8 -10
  [4,16,-30,8,10,-26,8,6,-26,8,-6,-30,8,-10],
// 4 16 -30 8 -10 -26 8 -6 26 8 -6 30 8 -10
  [4,16,-30,8,-10,-26,8,-6,26,8,-6,30,8,-10],
// 4 16 30 8 -10 26 8 -6 26 8 6 30 8 10
  [4,16,30,8,-10,26,8,-6,26,8,6,30,8,10],
// 1 16 0 8 0 30 0 0 0 1 0 0 0 10 recte4.dat
  [1,16,0,8,0,30,0,0,0,1,0,0,0,10, ldraw_lib__recte4()],
// 2 24 30 0 -10 30 8 -10
  [2,24,30,0,-10,30,8,-10],
// 1 16 0 4 0 -30 0 0 0 0 -4 0 10 0 box3-5a.dat
  [1,16,0,4,0,-30,0,0,0,0,-4,0,10,0, ldraw_lib__box3_5a()],
// 1 16 0 0 0 1 0 0 0 1 0 0 0 1 stug-1x3.dat
  [1,16,0,0,0,1,0,0,0,1,0,0,0,1, ldraw_lib__stug_1x3()],
];
module ldraw_lib__s__3623s02(step=0, col=false, unit=2/5, alt=false, line=0.2, solid=!$preview)
    makepoly(ldraw_lib__s__3623s02(), step=step, col=col, unit=unit, alt=alt, line=line, solid=solid);
ldraw_lib__s__3623s02(line=0.2);
// main file
use <../lib.scad>
use <s/3623s02.scad>
function ldraw_lib__3623pb1() = [
// 0 Plate  1 x  3 with Metallic Gold Side Face Pattern
// 0 Name: 3623pb1.dat
// 0 Author: Magnus Forsberg [MagFors]
// 0 !LDRAW_ORG Part UPDATE 2024-06
// 0 !LICENSE Licensed under CC BY 4.0 : see CAreadme.txt
// 
// 0 BFC CERTIFY CCW
  [0,"BFC","CERTIFY"],
  [0,"BFC","CCW"],
// 
// 0 !KEYWORDS Bricklink 3623pb021, Iron Man, Marvel, Rebrickable 3623pr0029
// 0 !KEYWORDS Set 76165, Superheroes
// 
// 0 !HISTORY 2024-07-29 [OrionP] Official Update 2024-06
// 
// 
// 1 16 0 0 0 1 0 0 0 1 0 0 0 1 s\3623s02.dat
  [1,16,0,0,0,1,0,0,0,1,0,0,0,1, ldraw_lib__s__3623s02()],
// 4 16 30 0 -10 -30 0 -10 -30 8 -10 30 8 -10
  [4,16,30,0,-10,-30,0,-10,-30,8,-10,30,8,-10],
// 4 82 30 0 -10 30 8 -10 30 8 10 30 0 10
  [4,82,30,0,-10,30,8,-10,30,8,10,30,0,10],
];
module ldraw_lib__3623pb1(step=0, col=false, unit=2/5, alt=false, line=0.2, solid=!$preview)
    makepoly(ldraw_lib__3623pb1(), step=step, col=col, unit=unit, alt=alt, line=line, solid=solid);
ldraw_lib__3623pb1(line=0.2);
